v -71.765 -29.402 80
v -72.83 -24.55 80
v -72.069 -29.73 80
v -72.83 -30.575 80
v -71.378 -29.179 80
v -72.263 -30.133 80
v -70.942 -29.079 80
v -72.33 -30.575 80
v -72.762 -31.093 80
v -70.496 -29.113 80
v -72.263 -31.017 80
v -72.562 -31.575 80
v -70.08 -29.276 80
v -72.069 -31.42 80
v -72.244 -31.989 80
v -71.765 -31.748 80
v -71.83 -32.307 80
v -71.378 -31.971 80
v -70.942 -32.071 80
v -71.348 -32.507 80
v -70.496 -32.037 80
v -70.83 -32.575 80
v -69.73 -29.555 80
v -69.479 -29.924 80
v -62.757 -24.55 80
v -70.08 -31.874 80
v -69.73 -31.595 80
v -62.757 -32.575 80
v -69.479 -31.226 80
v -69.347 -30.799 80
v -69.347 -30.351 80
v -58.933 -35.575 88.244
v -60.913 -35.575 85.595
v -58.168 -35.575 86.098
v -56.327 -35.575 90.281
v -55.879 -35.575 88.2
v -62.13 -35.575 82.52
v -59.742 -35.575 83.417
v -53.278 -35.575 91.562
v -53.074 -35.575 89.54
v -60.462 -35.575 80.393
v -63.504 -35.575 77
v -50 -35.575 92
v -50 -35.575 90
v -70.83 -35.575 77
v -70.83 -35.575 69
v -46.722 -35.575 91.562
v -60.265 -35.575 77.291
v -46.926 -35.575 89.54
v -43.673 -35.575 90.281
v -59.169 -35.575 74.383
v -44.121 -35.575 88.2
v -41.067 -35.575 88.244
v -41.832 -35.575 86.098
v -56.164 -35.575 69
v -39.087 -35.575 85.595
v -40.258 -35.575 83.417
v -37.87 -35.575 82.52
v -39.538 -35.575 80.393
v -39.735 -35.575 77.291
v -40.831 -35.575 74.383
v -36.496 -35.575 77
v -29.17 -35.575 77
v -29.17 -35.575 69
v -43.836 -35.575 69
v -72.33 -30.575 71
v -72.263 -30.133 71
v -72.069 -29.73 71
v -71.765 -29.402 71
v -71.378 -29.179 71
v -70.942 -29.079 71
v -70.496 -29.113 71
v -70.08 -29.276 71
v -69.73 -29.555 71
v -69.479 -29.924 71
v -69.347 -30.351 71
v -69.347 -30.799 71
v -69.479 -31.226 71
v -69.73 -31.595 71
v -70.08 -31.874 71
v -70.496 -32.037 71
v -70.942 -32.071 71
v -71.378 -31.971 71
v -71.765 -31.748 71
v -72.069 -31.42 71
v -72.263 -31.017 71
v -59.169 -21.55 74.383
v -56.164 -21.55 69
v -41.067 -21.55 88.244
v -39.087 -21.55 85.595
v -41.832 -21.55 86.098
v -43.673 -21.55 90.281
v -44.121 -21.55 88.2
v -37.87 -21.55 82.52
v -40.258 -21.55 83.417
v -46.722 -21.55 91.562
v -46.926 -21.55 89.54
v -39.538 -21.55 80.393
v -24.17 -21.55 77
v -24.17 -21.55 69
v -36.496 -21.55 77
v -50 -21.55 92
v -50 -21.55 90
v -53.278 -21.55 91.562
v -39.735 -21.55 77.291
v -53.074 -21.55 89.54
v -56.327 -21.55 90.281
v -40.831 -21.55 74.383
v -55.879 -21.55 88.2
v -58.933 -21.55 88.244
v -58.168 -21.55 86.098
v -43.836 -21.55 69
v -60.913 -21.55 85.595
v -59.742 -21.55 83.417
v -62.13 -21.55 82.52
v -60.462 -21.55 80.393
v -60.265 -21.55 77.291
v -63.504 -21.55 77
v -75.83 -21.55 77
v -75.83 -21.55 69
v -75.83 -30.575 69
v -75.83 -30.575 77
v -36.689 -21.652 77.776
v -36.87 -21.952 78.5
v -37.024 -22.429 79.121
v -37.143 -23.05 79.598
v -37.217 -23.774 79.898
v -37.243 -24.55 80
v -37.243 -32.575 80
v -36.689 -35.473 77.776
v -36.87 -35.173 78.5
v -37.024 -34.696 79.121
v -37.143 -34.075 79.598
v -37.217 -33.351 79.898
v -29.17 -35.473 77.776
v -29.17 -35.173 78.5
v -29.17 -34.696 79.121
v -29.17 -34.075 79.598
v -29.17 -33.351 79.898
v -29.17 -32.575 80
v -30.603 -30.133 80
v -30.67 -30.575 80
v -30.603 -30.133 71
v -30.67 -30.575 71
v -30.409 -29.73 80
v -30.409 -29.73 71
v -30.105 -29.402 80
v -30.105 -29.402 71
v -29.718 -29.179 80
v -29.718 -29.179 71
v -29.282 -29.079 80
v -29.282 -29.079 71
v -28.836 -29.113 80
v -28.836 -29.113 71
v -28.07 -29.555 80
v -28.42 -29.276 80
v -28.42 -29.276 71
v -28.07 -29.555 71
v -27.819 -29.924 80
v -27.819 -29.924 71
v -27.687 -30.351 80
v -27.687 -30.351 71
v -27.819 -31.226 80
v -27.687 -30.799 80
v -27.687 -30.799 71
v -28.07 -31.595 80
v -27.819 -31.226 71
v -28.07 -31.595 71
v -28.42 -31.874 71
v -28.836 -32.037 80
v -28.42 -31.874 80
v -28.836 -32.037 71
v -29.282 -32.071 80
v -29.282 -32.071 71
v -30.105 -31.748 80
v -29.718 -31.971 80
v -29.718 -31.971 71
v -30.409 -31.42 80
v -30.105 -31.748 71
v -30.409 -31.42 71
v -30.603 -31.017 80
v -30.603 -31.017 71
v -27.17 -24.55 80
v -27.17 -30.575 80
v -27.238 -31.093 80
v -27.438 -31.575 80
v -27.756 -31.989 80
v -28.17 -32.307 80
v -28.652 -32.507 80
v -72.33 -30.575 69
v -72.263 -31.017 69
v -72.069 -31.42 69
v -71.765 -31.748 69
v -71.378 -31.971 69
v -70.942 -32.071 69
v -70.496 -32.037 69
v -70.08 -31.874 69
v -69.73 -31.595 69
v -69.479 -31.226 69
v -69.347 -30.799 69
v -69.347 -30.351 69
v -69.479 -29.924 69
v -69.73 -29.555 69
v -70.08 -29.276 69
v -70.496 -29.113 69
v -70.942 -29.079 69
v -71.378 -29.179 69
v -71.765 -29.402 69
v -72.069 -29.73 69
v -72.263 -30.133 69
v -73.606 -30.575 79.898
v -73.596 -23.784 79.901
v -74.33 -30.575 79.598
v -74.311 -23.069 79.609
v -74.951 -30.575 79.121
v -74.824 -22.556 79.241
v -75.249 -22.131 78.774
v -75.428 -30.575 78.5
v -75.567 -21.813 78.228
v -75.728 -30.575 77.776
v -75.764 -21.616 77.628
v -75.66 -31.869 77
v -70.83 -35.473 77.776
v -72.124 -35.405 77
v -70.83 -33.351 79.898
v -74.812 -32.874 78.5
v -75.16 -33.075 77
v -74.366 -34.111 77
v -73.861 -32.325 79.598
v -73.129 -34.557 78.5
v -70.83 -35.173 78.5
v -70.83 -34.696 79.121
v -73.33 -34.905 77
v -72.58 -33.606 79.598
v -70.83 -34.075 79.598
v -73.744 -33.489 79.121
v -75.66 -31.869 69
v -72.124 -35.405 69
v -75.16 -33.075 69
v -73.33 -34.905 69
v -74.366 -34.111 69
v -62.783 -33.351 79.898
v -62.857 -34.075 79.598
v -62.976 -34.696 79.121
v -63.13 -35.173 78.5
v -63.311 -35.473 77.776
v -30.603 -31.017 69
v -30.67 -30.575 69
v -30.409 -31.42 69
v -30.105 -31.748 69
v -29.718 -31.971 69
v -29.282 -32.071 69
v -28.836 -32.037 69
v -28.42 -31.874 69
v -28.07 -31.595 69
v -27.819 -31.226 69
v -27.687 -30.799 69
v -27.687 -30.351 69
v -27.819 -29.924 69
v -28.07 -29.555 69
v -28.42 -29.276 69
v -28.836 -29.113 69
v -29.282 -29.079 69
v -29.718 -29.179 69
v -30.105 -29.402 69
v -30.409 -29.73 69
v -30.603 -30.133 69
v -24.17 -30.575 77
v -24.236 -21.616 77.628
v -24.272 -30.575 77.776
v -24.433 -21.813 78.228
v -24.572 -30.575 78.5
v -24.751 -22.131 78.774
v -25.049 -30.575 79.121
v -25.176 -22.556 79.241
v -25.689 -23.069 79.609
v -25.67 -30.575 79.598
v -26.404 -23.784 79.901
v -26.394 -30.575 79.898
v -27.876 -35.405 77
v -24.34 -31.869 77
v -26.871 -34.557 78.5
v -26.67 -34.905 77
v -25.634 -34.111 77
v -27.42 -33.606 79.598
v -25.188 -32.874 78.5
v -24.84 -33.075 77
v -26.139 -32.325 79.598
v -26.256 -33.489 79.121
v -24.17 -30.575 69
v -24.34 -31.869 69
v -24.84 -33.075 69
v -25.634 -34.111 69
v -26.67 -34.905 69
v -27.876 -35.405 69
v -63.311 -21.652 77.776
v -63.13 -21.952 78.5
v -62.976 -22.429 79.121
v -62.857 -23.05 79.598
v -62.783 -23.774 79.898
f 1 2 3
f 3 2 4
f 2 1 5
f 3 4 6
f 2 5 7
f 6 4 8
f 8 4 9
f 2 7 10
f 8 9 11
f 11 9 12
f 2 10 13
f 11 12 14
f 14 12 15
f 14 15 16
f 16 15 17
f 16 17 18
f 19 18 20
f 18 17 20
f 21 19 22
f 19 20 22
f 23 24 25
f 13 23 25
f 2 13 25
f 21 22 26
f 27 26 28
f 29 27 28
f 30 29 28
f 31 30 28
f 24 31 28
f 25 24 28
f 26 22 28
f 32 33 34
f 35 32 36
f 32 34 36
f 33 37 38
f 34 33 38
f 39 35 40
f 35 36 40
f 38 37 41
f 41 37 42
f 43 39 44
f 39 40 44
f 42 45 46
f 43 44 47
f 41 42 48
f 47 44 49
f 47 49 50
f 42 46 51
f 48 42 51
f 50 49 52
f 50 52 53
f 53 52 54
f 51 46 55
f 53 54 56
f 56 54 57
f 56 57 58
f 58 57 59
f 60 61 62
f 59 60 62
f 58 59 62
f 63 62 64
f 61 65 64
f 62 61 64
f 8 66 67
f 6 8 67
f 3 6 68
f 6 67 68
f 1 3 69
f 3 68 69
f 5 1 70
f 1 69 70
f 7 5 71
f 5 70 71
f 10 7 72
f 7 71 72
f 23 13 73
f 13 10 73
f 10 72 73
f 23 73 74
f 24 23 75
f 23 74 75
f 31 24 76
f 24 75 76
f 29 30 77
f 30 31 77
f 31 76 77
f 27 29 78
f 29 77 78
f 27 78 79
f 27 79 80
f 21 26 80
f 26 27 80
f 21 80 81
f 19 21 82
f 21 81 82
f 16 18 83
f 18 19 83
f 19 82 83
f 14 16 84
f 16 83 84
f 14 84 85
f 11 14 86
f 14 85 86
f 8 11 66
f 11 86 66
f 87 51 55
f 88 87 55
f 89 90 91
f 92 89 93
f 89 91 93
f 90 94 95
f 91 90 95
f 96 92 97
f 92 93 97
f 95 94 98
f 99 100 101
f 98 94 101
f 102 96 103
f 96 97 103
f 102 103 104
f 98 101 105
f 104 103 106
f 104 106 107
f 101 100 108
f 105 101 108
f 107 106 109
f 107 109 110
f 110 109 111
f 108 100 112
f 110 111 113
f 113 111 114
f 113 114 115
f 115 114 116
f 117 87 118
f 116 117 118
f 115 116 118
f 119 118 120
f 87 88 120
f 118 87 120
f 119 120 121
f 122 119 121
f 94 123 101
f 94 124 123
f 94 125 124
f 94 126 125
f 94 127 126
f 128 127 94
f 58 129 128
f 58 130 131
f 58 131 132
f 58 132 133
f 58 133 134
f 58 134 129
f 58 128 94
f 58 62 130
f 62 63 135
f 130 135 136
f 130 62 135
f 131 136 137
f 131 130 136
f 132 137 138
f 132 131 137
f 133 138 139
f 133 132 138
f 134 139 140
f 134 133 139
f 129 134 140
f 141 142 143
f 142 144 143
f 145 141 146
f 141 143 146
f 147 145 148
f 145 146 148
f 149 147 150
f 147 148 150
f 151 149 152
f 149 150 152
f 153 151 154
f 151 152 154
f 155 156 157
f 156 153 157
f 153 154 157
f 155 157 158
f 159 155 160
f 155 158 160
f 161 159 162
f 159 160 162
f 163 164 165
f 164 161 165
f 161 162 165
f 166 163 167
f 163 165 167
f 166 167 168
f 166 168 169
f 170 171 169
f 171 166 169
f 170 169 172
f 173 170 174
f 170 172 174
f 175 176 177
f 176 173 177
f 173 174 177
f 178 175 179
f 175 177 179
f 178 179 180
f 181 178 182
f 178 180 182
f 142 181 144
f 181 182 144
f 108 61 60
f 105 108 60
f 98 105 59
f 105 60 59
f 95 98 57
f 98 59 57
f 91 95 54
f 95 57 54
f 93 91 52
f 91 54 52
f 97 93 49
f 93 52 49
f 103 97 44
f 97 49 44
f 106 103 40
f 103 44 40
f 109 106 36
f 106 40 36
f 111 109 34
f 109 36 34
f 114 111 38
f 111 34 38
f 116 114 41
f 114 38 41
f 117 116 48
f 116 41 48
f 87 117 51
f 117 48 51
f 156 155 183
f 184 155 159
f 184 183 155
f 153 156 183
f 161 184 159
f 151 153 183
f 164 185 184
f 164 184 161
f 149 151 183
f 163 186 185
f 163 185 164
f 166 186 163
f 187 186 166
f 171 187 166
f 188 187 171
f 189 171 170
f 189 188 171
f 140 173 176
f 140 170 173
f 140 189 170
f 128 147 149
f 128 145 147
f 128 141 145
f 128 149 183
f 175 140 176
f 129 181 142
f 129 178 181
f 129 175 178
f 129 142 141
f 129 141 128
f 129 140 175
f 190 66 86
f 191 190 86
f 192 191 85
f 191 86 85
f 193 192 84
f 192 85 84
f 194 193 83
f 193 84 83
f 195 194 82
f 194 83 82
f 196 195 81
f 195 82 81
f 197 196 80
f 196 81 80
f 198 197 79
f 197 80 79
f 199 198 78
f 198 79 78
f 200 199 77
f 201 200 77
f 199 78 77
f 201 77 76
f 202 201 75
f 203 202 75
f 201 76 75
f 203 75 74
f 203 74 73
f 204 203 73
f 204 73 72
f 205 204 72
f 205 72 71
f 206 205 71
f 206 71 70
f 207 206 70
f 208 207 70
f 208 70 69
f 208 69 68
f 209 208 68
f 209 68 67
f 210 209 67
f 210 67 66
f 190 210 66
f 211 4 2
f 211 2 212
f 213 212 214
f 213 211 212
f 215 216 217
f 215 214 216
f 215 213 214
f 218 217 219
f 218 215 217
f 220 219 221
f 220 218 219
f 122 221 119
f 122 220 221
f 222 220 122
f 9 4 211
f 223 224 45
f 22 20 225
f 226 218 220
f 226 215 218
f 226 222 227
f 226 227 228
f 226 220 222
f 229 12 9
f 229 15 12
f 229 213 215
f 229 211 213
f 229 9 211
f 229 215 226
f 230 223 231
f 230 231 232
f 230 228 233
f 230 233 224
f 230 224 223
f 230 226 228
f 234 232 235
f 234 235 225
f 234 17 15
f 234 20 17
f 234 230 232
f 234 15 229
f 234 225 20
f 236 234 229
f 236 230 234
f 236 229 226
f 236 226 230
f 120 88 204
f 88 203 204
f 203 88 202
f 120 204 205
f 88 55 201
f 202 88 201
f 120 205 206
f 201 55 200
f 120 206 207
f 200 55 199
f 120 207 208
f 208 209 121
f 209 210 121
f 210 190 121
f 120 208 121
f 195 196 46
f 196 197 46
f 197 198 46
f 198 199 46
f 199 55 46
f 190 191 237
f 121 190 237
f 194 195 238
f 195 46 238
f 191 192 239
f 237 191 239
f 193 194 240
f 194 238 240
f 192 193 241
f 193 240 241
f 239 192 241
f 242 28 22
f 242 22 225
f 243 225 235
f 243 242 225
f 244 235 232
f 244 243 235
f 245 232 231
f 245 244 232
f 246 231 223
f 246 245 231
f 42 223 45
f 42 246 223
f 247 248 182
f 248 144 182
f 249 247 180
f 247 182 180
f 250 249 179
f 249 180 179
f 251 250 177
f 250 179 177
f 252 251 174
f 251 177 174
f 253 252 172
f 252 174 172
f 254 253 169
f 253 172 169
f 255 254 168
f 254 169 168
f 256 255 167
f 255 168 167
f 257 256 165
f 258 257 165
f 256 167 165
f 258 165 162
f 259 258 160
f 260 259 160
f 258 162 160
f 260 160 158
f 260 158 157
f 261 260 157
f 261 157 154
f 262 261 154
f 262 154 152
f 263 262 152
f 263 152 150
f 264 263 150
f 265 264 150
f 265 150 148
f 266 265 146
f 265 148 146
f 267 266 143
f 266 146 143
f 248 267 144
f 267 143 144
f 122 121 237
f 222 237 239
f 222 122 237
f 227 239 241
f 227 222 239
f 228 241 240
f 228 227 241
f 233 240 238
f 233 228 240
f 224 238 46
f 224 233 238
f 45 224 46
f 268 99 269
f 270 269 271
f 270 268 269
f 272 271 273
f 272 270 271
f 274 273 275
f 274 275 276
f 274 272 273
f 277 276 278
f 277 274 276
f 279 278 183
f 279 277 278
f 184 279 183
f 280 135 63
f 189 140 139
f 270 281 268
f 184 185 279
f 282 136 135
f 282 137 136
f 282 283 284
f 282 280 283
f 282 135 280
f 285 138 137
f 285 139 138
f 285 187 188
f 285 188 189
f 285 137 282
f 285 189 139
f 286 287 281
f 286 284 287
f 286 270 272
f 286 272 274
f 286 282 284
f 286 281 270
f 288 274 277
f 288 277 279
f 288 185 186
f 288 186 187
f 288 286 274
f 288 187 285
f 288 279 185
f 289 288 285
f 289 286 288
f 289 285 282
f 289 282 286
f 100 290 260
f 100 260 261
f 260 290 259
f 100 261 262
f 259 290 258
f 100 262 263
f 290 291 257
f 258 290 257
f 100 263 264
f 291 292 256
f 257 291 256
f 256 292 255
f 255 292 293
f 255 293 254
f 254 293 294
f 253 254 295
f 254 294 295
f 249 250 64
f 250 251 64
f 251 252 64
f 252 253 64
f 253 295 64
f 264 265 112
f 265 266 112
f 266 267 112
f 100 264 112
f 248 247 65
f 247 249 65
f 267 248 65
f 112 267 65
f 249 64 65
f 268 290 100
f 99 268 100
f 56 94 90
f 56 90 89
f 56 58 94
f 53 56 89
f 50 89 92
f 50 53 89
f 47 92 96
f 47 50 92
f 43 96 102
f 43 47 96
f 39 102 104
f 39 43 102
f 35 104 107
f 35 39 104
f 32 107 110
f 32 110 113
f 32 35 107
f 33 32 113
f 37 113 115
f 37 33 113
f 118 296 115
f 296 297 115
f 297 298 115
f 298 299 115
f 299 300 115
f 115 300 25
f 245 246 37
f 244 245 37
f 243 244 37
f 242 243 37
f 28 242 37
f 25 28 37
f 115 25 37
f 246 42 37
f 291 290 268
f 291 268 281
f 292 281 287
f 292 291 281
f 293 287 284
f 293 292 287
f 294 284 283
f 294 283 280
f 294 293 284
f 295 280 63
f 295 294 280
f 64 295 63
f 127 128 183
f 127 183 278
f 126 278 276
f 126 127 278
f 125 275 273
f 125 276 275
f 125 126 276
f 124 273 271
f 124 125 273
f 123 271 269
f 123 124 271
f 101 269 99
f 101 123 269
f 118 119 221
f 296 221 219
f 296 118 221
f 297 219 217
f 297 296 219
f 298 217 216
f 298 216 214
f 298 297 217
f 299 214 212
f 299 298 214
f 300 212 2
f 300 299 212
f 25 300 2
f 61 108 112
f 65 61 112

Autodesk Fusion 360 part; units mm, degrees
sketch "Sketch1" plane through (0, 0, 69) normal (0, 0, 1) x (-1, 0, 0)
  circle A0 centre (29.17, 30.575) radius 3.05
  circle A1 centre (70.83, 30.575) radius 3.05
  line L0 (24.17, 21.15) -> (75.83, 21.15)
  line L1 (75.83, 21.15) -> (75.83, 30.575)
  arc A2 (75.83, 30.575) -> (70.83, 35.575) centre (70.83, 30.575) ccw
  line L2 (70.83, 35.575) -> (29.17, 35.575)
  arc A3 (29.17, 35.575) -> (24.17, 30.575) centre (29.17, 30.575) ccw
  line L3 (24.17, 30.575) -> (24.17, 21.15)
  line L4 (29.8595, -5) -> (27.8595, -5)
  arc A4 (23.8595, -1) -> (27.8595, -5) centre (27.8595, -1) ccw
  line L5 (23.8595, -1) -> (23.8595, 1)
  arc A5 (27.8595, 5) -> (23.8595, 1) centre (27.8595, 1) ccw
  line L6 (27.8595, 5) -> (29.8595, 5)
  arc A6 (33.8595, 1) -> (29.8595, 5) centre (29.8595, 1) ccw
  line L7 (33.8595, 1) -> (33.8595, -1)
  arc A7 (29.8595, -5) -> (33.8595, -1) centre (29.8595, -1) ccw
  circle A8 centre (50, 0) radius 10
  line L8 (76.1405, 1) -> (76.1405, -1)
  arc A9 (72.1405, -5) -> (76.1405, -1) centre (72.1405, -1) ccw
  line L9 (72.1405, -5) -> (70.1405, -5)
  arc A10 (66.1405, -1) -> (70.1405, -5) centre (70.1405, -1) ccw
  line L10 (66.1405, -1) -> (66.1405, 1)
  arc A11 (70.1405, 5) -> (66.1405, 1) centre (70.1405, 1) ccw
  line L11 (70.1405, 5) -> (72.1405, 5)
  arc A12 (76.1405, 1) -> (72.1405, 5) centre (72.1405, 1) ccw
  circle A13 centre (95.6212, 10.575) radius 1.5
  circle A14 centre (37.085, 10.575) radius 1.5
  circle A15 centre (62.915, 10.575) radius 1.5
  circle A16 centre (37.085, -10.575) radius 1.5
  circle A17 centre (62.915, -10.575) radius 1.5
  circle A18 centre (4.3788, 10.575) radius 1.5
  circle A19 centre (95.6212, -10.575) radius 1.5
  circle A20 centre (4.3788, -10.575) radius 1.5
  line L12 (-10, -21.15) -> (110, -21.15)
  line L13 (110, -21.15) -> (110, 21.15)
  line L14 (110, 21.15) -> (-10, 21.15)
  line L15 (-10, 21.15) -> (-10, -21.15)
  line L16 (24.17, 21.55) -> (75.83, 21.55)
  dimension "d176" = -0.4
extrude "Extrude1" add sketch "Sketch1" along normal blind 2 contours L1 A2 L2 A3 L3 L16
sketch "Sketch2" plane through (0, -35.575, 0) normal (0, -1, 0) x (1, 0, 0)
  line L0 (-70.83, 69) -> (-29.17, 69)
  line L1 (-29.17, 69) -> (-29.17, 71)
  line L2 (-29.17, 71) -> (-70.83, 71)
  line L3 (-70.83, 71) -> (-70.83, 69)
  line L4 (9.9999, 77.6216) -> (10, 92) construction
  line L5 (10, 92) -> (-110, 92) construction
  line L6 (-110, 92) -> (-109.9999, 77.6216) construction
  line L7 (-109.9999, 77.6216) -> (-98.6213, 89) construction
  line L8 (-98.6213, 89) -> (-92.6213, 89) construction
  line L9 (-92.6213, 89) -> (-81.2425, 77.621) construction
  line L10 (-81.2425, 77.621) -> (-81.2425, 89) construction
  line L11 (-81.2425, 89) -> (-18.7575, 89) construction
  line L12 (-18.7575, 89) -> (-18.7575, 77.621) construction
  line L13 (-18.7575, 77.621) -> (-7.3788, 89) construction
  line L14 (-7.3788, 89) -> (-1.3788, 89) construction
  line L15 (-1.3788, 89) -> (9.9999, 77.6216) construction
  line L16 (-50, 70) -> (-50, 89)
  circle A0 centre (-50, 79.5) radius 10.5
  arc A1 (-40.8349, 71) -> (-59.1652, 71) centre (-50, 79.5) ccw
  line L17 (-59.1652, 71) -> (-70.83, 71) construction
  line L18 (-40.8349, 71) -> (-29.17, 71) construction
  line L19 (-64.9976, 71) -> (-62.1298, 82.5197)
  line L20 (-35.0024, 71) -> (-37.8702, 82.5197)
  dimension "d179" = 21
extrude "Extrude2" add sketch "Sketch2" against normal blind 14.025 contours L2 A0 A1 | L2 A1 L19 | L2 A1 L20
sketch "Sketch3" plane through (0, -35.575, 0) normal (0, -1, 0) x (1, 0, 0)
  line L0 (-64.9976, 71) -> (-70.83, 71)
  line L1 (-70.83, 71) -> (-70.83, 69)
  line L2 (-70.83, 69) -> (-29.17, 69)
  line L3 (-29.17, 69) -> (-29.17, 71)
  line L4 (-29.17, 71) -> (-35.0024, 71)
  line L5 (-35.0024, 71) -> (-37.8702, 82.5197)
  arc A0 (-37.8702, 82.5197) -> (-62.1298, 82.5197) centre (-50, 79.5) ccw
  line L6 (-62.1298, 82.5197) -> (-64.9976, 71)
  arc A1 (-43.8356, 71) -> (-56.1644, 71) centre (-50, 79.5) ccw
  line L7 (-43.8356, 71) -> (-56.1644, 71)
  line L8 (-59.1687, 74.3828) -> (-56.1644, 69)
  line L9 (-50, 69) -> (-50, 90) construction
  line L10 (-40.8313, 74.3828) -> (-43.8356, 69)
  arc A2 (-40.8313, 74.3828) -> (-59.1687, 74.3828) centre (-50, 79.5) ccw
  dimension "d183" = 21
extrude "Extrude3" cut sketch "Sketch3" against normal blind 14.025 contours L2 A1 L7 L8 L10
sketch "Sketch4" plane through (0, 0, 71) normal (0, 0, 1) x (-1, 0, 0)
  line L0 (64.9976, 35.575) -> (64.9976, 21.55)
  line L1 (64.9976, 21.55) -> (75.83, 21.55)
  line L2 (75.83, 21.55) -> (75.83, 30.575)
  arc A0 (75.83, 30.575) -> (70.83, 35.575) centre (70.83, 30.575) ccw
  line L3 (70.83, 35.575) -> (64.9976, 35.575)
  circle A1 centre (70.83, 30.575) radius 3.05
  line L4 (62.1298, 35.575) -> (37.8702, 35.575)
  line L5 (37.8702, 35.575) -> (37.8702, 21.55)
  line L6 (37.8702, 21.55) -> (62.1298, 21.55)
  line L7 (62.1298, 21.55) -> (62.1298, 35.575)
  line L8 (64.9976, 35.575) -> (62.1298, 35.575)
  line L9 (62.1298, 35.575) -> (62.1298, 21.55)
  line L10 (62.1298, 21.55) -> (64.9976, 21.55)
  line L11 (64.9976, 21.55) -> (64.9976, 35.575)
  line L12 (37.8702, 35.575) -> (35.0024, 35.575)
  line L13 (35.0024, 35.575) -> (35.0024, 21.55)
  line L14 (35.0024, 21.55) -> (37.8702, 21.55)
  line L15 (37.8702, 21.55) -> (37.8702, 35.575)
  circle A2 centre (29.17, 30.575) radius 3.05
  line L16 (35.0024, 21.55) -> (35.0024, 35.575)
  line L17 (35.0024, 35.575) -> (29.17, 35.575)
  arc A3 (29.17, 35.575) -> (24.17, 30.575) centre (29.17, 30.575) ccw
  line L18 (24.17, 30.575) -> (24.17, 21.55)
  line L19 (24.17, 21.55) -> (35.0024, 21.55)
  line L20 (50, 21.55) -> (50, 35.575) construction
  circle A4 centre (70.83, 30.575) radius 1.5
  circle A5 centre (29.17, 30.575) radius 1.5
  dimension "d186" = 3
  dimension "d187" = 3
extrude "Extrude4" add sketch "Sketch4" against normal blind 2 contours A1 | A2
delete_face "DeleteFace1" 1 faces at (-75.1601, -33.075, 70.3333)
delete_face "DeleteFace2" 1 faces at (-24.445, -32.2103, 70.3333)
sketch "Sketch5" plane through (0, -35.575, 0) normal (0, -1, 0) x (1, 0, 0)
  line L0 (-24.17, 71) -> (-35.0024, 71)
  line L1 (-35.0024, 71) -> (-37.8702, 82.5197)
  arc A0 (-37.8702, 82.5197) -> (-62.1298, 82.5197) centre (-50, 79.5) ccw
  line L2 (-62.1298, 82.5197) -> (-64.9976, 71)
  line L3 (-64.9976, 71) -> (-75.83, 71)
  line L4 (-75.83, 71) -> (-75.83, 69)
  line L5 (-75.83, 69) -> (-56.1644, 69)
  line L6 (-56.1644, 69) -> (-59.1687, 74.3828)
  arc A1 (-40.8313, 74.3828) -> (-59.1687, 74.3828) centre (-50, 79.5) ccw
  line L7 (-40.8313, 74.3828) -> (-43.8356, 69)
  line L8 (-43.8356, 69) -> (-24.17, 69)
  line L9 (-24.17, 69) -> (-24.17, 71)
  line L10 (-70.4138, 71) -> (-70.4138, 80) construction
  line L11 (-50, 92) -> (-50, 68.7831) construction
  line L12 (-75.83, 71) -> (-75.83, 80)
  line L13 (-75.83, 80) -> (-62.7571, 80)
  line L14 (-24.17, 71) -> (-24.17, 80)
  line L15 (-24.17, 80) -> (-37.243, 80)
  dimension "d297" = 9
extrude "Extrude5" add sketch "Sketch5" against normal blind 14.025 contours L0 L1 L14 L15 | L2 L3 L12 L13
extrude "Extrude6" cut 2 faces at (-70.0515, -30.2933, 71) (-28.7569, -30.8567, 71) along direction (0, 0, 1) blind 9
fillet "Fillet1" radius 5 5 edges at (-75.83, -35.575, 74.5) (-24.17, -35.575, 75.5) (-24.17, -35.575, 70) (-24.17, -35.575, 75.5) (-24.17, -35.575, 70)
fillet "Fillet2" radius 3 8 edges at (-69.2935, -21.55, 80) (-66.7935, -35.575, 80) (-74.3655, -34.1105, 80) (-75.83, -26.0625, 80) (-30.7065, -21.55, 80) (-33.2065, -35.575, 80) (-25.6345, -34.1105, 80) (-24.17, -26.0625, 80)
